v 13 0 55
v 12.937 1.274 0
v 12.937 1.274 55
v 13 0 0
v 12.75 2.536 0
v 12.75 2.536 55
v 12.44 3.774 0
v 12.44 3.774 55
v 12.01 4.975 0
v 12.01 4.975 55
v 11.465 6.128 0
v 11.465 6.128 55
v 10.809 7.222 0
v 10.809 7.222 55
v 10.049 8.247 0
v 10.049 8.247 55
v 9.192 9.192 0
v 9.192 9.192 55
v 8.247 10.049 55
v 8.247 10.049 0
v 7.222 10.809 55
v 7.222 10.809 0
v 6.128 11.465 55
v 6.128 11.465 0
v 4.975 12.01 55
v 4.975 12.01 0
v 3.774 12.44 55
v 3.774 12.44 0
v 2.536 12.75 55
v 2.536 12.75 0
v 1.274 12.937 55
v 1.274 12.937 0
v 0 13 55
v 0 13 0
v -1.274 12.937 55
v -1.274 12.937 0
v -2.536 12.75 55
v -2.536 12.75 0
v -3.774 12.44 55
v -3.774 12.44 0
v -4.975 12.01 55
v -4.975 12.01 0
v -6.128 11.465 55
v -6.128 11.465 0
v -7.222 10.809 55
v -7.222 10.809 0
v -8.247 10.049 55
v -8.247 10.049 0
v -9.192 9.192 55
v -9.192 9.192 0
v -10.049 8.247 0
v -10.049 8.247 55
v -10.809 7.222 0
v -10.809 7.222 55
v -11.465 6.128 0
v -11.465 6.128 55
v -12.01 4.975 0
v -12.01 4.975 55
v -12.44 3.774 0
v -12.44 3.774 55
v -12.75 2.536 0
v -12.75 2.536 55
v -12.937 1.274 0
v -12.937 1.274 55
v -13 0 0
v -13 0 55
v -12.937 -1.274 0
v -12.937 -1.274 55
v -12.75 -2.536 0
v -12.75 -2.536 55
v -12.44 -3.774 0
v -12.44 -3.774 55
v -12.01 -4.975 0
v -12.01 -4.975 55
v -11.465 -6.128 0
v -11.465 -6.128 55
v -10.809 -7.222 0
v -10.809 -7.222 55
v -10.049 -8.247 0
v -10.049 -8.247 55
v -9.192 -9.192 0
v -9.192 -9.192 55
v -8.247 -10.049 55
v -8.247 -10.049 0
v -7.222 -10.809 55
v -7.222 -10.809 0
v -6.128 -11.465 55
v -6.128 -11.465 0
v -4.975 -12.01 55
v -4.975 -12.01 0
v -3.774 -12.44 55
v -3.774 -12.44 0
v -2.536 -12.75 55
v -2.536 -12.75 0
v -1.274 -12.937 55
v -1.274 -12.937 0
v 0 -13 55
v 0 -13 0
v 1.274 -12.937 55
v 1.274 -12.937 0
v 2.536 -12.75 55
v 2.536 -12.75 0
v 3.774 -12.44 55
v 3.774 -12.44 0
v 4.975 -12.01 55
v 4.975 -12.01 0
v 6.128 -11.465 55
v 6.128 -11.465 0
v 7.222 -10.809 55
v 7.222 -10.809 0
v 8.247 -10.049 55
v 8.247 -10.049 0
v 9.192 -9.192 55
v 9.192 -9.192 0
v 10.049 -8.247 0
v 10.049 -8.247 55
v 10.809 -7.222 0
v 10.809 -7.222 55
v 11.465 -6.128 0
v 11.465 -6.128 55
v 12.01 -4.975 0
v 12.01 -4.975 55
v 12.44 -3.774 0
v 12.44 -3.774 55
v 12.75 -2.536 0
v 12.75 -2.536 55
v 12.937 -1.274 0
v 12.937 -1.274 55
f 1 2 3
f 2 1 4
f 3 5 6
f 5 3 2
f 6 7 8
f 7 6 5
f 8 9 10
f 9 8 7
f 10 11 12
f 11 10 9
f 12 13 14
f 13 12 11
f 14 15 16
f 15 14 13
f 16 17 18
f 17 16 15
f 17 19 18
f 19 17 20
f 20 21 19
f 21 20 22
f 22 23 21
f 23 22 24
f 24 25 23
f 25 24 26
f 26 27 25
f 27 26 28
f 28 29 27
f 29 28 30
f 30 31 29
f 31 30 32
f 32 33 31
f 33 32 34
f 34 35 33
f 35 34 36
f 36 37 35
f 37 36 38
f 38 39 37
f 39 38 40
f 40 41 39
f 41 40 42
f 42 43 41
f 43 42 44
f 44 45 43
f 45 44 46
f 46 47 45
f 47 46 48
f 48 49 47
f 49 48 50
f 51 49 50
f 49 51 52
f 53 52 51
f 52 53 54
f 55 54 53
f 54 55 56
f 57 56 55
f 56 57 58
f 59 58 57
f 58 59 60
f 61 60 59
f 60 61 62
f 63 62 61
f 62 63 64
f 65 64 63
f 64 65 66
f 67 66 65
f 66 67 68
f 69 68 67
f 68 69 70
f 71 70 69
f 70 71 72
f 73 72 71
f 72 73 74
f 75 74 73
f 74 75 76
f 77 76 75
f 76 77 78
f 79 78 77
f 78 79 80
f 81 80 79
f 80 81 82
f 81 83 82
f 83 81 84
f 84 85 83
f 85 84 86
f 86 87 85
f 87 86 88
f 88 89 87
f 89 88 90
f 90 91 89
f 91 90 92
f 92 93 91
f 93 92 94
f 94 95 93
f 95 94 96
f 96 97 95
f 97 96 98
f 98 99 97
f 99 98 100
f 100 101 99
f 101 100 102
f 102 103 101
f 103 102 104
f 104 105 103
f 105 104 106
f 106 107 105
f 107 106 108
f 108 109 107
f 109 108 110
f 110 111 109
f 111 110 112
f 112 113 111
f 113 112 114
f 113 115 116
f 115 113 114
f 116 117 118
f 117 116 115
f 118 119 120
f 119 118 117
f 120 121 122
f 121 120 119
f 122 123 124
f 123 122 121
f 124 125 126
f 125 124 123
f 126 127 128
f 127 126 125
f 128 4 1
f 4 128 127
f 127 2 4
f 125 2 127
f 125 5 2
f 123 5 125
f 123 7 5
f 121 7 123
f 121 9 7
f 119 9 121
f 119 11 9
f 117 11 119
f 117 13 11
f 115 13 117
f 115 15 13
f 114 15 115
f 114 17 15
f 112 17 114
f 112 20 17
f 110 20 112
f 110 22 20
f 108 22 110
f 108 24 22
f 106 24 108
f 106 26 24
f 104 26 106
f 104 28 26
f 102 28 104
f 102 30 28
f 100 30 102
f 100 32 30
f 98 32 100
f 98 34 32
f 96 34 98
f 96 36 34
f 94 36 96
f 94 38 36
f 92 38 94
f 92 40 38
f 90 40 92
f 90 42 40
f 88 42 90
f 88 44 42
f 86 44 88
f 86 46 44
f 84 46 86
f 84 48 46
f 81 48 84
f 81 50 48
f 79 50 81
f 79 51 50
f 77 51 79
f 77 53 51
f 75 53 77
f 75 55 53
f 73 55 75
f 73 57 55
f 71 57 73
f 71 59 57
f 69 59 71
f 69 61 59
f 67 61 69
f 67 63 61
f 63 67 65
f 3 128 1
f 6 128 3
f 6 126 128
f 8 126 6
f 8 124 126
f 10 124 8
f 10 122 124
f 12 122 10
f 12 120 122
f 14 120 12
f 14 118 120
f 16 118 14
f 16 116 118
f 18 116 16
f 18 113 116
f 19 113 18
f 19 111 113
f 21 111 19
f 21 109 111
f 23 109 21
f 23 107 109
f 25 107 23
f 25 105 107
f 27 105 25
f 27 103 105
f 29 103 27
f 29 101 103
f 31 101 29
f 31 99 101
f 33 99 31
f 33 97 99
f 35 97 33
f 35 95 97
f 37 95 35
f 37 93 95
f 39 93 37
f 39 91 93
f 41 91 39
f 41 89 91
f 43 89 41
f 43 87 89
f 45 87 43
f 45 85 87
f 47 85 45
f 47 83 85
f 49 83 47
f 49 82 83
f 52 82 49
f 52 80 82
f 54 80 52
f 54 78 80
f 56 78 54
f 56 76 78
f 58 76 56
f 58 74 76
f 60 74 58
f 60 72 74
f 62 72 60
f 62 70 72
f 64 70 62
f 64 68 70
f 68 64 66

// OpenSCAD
// Purchased TD04A PROVISIONAL d26, length55; face at Z=0, cable exits Z=55.
$fn=64;cylinder(d=26,h=55);
